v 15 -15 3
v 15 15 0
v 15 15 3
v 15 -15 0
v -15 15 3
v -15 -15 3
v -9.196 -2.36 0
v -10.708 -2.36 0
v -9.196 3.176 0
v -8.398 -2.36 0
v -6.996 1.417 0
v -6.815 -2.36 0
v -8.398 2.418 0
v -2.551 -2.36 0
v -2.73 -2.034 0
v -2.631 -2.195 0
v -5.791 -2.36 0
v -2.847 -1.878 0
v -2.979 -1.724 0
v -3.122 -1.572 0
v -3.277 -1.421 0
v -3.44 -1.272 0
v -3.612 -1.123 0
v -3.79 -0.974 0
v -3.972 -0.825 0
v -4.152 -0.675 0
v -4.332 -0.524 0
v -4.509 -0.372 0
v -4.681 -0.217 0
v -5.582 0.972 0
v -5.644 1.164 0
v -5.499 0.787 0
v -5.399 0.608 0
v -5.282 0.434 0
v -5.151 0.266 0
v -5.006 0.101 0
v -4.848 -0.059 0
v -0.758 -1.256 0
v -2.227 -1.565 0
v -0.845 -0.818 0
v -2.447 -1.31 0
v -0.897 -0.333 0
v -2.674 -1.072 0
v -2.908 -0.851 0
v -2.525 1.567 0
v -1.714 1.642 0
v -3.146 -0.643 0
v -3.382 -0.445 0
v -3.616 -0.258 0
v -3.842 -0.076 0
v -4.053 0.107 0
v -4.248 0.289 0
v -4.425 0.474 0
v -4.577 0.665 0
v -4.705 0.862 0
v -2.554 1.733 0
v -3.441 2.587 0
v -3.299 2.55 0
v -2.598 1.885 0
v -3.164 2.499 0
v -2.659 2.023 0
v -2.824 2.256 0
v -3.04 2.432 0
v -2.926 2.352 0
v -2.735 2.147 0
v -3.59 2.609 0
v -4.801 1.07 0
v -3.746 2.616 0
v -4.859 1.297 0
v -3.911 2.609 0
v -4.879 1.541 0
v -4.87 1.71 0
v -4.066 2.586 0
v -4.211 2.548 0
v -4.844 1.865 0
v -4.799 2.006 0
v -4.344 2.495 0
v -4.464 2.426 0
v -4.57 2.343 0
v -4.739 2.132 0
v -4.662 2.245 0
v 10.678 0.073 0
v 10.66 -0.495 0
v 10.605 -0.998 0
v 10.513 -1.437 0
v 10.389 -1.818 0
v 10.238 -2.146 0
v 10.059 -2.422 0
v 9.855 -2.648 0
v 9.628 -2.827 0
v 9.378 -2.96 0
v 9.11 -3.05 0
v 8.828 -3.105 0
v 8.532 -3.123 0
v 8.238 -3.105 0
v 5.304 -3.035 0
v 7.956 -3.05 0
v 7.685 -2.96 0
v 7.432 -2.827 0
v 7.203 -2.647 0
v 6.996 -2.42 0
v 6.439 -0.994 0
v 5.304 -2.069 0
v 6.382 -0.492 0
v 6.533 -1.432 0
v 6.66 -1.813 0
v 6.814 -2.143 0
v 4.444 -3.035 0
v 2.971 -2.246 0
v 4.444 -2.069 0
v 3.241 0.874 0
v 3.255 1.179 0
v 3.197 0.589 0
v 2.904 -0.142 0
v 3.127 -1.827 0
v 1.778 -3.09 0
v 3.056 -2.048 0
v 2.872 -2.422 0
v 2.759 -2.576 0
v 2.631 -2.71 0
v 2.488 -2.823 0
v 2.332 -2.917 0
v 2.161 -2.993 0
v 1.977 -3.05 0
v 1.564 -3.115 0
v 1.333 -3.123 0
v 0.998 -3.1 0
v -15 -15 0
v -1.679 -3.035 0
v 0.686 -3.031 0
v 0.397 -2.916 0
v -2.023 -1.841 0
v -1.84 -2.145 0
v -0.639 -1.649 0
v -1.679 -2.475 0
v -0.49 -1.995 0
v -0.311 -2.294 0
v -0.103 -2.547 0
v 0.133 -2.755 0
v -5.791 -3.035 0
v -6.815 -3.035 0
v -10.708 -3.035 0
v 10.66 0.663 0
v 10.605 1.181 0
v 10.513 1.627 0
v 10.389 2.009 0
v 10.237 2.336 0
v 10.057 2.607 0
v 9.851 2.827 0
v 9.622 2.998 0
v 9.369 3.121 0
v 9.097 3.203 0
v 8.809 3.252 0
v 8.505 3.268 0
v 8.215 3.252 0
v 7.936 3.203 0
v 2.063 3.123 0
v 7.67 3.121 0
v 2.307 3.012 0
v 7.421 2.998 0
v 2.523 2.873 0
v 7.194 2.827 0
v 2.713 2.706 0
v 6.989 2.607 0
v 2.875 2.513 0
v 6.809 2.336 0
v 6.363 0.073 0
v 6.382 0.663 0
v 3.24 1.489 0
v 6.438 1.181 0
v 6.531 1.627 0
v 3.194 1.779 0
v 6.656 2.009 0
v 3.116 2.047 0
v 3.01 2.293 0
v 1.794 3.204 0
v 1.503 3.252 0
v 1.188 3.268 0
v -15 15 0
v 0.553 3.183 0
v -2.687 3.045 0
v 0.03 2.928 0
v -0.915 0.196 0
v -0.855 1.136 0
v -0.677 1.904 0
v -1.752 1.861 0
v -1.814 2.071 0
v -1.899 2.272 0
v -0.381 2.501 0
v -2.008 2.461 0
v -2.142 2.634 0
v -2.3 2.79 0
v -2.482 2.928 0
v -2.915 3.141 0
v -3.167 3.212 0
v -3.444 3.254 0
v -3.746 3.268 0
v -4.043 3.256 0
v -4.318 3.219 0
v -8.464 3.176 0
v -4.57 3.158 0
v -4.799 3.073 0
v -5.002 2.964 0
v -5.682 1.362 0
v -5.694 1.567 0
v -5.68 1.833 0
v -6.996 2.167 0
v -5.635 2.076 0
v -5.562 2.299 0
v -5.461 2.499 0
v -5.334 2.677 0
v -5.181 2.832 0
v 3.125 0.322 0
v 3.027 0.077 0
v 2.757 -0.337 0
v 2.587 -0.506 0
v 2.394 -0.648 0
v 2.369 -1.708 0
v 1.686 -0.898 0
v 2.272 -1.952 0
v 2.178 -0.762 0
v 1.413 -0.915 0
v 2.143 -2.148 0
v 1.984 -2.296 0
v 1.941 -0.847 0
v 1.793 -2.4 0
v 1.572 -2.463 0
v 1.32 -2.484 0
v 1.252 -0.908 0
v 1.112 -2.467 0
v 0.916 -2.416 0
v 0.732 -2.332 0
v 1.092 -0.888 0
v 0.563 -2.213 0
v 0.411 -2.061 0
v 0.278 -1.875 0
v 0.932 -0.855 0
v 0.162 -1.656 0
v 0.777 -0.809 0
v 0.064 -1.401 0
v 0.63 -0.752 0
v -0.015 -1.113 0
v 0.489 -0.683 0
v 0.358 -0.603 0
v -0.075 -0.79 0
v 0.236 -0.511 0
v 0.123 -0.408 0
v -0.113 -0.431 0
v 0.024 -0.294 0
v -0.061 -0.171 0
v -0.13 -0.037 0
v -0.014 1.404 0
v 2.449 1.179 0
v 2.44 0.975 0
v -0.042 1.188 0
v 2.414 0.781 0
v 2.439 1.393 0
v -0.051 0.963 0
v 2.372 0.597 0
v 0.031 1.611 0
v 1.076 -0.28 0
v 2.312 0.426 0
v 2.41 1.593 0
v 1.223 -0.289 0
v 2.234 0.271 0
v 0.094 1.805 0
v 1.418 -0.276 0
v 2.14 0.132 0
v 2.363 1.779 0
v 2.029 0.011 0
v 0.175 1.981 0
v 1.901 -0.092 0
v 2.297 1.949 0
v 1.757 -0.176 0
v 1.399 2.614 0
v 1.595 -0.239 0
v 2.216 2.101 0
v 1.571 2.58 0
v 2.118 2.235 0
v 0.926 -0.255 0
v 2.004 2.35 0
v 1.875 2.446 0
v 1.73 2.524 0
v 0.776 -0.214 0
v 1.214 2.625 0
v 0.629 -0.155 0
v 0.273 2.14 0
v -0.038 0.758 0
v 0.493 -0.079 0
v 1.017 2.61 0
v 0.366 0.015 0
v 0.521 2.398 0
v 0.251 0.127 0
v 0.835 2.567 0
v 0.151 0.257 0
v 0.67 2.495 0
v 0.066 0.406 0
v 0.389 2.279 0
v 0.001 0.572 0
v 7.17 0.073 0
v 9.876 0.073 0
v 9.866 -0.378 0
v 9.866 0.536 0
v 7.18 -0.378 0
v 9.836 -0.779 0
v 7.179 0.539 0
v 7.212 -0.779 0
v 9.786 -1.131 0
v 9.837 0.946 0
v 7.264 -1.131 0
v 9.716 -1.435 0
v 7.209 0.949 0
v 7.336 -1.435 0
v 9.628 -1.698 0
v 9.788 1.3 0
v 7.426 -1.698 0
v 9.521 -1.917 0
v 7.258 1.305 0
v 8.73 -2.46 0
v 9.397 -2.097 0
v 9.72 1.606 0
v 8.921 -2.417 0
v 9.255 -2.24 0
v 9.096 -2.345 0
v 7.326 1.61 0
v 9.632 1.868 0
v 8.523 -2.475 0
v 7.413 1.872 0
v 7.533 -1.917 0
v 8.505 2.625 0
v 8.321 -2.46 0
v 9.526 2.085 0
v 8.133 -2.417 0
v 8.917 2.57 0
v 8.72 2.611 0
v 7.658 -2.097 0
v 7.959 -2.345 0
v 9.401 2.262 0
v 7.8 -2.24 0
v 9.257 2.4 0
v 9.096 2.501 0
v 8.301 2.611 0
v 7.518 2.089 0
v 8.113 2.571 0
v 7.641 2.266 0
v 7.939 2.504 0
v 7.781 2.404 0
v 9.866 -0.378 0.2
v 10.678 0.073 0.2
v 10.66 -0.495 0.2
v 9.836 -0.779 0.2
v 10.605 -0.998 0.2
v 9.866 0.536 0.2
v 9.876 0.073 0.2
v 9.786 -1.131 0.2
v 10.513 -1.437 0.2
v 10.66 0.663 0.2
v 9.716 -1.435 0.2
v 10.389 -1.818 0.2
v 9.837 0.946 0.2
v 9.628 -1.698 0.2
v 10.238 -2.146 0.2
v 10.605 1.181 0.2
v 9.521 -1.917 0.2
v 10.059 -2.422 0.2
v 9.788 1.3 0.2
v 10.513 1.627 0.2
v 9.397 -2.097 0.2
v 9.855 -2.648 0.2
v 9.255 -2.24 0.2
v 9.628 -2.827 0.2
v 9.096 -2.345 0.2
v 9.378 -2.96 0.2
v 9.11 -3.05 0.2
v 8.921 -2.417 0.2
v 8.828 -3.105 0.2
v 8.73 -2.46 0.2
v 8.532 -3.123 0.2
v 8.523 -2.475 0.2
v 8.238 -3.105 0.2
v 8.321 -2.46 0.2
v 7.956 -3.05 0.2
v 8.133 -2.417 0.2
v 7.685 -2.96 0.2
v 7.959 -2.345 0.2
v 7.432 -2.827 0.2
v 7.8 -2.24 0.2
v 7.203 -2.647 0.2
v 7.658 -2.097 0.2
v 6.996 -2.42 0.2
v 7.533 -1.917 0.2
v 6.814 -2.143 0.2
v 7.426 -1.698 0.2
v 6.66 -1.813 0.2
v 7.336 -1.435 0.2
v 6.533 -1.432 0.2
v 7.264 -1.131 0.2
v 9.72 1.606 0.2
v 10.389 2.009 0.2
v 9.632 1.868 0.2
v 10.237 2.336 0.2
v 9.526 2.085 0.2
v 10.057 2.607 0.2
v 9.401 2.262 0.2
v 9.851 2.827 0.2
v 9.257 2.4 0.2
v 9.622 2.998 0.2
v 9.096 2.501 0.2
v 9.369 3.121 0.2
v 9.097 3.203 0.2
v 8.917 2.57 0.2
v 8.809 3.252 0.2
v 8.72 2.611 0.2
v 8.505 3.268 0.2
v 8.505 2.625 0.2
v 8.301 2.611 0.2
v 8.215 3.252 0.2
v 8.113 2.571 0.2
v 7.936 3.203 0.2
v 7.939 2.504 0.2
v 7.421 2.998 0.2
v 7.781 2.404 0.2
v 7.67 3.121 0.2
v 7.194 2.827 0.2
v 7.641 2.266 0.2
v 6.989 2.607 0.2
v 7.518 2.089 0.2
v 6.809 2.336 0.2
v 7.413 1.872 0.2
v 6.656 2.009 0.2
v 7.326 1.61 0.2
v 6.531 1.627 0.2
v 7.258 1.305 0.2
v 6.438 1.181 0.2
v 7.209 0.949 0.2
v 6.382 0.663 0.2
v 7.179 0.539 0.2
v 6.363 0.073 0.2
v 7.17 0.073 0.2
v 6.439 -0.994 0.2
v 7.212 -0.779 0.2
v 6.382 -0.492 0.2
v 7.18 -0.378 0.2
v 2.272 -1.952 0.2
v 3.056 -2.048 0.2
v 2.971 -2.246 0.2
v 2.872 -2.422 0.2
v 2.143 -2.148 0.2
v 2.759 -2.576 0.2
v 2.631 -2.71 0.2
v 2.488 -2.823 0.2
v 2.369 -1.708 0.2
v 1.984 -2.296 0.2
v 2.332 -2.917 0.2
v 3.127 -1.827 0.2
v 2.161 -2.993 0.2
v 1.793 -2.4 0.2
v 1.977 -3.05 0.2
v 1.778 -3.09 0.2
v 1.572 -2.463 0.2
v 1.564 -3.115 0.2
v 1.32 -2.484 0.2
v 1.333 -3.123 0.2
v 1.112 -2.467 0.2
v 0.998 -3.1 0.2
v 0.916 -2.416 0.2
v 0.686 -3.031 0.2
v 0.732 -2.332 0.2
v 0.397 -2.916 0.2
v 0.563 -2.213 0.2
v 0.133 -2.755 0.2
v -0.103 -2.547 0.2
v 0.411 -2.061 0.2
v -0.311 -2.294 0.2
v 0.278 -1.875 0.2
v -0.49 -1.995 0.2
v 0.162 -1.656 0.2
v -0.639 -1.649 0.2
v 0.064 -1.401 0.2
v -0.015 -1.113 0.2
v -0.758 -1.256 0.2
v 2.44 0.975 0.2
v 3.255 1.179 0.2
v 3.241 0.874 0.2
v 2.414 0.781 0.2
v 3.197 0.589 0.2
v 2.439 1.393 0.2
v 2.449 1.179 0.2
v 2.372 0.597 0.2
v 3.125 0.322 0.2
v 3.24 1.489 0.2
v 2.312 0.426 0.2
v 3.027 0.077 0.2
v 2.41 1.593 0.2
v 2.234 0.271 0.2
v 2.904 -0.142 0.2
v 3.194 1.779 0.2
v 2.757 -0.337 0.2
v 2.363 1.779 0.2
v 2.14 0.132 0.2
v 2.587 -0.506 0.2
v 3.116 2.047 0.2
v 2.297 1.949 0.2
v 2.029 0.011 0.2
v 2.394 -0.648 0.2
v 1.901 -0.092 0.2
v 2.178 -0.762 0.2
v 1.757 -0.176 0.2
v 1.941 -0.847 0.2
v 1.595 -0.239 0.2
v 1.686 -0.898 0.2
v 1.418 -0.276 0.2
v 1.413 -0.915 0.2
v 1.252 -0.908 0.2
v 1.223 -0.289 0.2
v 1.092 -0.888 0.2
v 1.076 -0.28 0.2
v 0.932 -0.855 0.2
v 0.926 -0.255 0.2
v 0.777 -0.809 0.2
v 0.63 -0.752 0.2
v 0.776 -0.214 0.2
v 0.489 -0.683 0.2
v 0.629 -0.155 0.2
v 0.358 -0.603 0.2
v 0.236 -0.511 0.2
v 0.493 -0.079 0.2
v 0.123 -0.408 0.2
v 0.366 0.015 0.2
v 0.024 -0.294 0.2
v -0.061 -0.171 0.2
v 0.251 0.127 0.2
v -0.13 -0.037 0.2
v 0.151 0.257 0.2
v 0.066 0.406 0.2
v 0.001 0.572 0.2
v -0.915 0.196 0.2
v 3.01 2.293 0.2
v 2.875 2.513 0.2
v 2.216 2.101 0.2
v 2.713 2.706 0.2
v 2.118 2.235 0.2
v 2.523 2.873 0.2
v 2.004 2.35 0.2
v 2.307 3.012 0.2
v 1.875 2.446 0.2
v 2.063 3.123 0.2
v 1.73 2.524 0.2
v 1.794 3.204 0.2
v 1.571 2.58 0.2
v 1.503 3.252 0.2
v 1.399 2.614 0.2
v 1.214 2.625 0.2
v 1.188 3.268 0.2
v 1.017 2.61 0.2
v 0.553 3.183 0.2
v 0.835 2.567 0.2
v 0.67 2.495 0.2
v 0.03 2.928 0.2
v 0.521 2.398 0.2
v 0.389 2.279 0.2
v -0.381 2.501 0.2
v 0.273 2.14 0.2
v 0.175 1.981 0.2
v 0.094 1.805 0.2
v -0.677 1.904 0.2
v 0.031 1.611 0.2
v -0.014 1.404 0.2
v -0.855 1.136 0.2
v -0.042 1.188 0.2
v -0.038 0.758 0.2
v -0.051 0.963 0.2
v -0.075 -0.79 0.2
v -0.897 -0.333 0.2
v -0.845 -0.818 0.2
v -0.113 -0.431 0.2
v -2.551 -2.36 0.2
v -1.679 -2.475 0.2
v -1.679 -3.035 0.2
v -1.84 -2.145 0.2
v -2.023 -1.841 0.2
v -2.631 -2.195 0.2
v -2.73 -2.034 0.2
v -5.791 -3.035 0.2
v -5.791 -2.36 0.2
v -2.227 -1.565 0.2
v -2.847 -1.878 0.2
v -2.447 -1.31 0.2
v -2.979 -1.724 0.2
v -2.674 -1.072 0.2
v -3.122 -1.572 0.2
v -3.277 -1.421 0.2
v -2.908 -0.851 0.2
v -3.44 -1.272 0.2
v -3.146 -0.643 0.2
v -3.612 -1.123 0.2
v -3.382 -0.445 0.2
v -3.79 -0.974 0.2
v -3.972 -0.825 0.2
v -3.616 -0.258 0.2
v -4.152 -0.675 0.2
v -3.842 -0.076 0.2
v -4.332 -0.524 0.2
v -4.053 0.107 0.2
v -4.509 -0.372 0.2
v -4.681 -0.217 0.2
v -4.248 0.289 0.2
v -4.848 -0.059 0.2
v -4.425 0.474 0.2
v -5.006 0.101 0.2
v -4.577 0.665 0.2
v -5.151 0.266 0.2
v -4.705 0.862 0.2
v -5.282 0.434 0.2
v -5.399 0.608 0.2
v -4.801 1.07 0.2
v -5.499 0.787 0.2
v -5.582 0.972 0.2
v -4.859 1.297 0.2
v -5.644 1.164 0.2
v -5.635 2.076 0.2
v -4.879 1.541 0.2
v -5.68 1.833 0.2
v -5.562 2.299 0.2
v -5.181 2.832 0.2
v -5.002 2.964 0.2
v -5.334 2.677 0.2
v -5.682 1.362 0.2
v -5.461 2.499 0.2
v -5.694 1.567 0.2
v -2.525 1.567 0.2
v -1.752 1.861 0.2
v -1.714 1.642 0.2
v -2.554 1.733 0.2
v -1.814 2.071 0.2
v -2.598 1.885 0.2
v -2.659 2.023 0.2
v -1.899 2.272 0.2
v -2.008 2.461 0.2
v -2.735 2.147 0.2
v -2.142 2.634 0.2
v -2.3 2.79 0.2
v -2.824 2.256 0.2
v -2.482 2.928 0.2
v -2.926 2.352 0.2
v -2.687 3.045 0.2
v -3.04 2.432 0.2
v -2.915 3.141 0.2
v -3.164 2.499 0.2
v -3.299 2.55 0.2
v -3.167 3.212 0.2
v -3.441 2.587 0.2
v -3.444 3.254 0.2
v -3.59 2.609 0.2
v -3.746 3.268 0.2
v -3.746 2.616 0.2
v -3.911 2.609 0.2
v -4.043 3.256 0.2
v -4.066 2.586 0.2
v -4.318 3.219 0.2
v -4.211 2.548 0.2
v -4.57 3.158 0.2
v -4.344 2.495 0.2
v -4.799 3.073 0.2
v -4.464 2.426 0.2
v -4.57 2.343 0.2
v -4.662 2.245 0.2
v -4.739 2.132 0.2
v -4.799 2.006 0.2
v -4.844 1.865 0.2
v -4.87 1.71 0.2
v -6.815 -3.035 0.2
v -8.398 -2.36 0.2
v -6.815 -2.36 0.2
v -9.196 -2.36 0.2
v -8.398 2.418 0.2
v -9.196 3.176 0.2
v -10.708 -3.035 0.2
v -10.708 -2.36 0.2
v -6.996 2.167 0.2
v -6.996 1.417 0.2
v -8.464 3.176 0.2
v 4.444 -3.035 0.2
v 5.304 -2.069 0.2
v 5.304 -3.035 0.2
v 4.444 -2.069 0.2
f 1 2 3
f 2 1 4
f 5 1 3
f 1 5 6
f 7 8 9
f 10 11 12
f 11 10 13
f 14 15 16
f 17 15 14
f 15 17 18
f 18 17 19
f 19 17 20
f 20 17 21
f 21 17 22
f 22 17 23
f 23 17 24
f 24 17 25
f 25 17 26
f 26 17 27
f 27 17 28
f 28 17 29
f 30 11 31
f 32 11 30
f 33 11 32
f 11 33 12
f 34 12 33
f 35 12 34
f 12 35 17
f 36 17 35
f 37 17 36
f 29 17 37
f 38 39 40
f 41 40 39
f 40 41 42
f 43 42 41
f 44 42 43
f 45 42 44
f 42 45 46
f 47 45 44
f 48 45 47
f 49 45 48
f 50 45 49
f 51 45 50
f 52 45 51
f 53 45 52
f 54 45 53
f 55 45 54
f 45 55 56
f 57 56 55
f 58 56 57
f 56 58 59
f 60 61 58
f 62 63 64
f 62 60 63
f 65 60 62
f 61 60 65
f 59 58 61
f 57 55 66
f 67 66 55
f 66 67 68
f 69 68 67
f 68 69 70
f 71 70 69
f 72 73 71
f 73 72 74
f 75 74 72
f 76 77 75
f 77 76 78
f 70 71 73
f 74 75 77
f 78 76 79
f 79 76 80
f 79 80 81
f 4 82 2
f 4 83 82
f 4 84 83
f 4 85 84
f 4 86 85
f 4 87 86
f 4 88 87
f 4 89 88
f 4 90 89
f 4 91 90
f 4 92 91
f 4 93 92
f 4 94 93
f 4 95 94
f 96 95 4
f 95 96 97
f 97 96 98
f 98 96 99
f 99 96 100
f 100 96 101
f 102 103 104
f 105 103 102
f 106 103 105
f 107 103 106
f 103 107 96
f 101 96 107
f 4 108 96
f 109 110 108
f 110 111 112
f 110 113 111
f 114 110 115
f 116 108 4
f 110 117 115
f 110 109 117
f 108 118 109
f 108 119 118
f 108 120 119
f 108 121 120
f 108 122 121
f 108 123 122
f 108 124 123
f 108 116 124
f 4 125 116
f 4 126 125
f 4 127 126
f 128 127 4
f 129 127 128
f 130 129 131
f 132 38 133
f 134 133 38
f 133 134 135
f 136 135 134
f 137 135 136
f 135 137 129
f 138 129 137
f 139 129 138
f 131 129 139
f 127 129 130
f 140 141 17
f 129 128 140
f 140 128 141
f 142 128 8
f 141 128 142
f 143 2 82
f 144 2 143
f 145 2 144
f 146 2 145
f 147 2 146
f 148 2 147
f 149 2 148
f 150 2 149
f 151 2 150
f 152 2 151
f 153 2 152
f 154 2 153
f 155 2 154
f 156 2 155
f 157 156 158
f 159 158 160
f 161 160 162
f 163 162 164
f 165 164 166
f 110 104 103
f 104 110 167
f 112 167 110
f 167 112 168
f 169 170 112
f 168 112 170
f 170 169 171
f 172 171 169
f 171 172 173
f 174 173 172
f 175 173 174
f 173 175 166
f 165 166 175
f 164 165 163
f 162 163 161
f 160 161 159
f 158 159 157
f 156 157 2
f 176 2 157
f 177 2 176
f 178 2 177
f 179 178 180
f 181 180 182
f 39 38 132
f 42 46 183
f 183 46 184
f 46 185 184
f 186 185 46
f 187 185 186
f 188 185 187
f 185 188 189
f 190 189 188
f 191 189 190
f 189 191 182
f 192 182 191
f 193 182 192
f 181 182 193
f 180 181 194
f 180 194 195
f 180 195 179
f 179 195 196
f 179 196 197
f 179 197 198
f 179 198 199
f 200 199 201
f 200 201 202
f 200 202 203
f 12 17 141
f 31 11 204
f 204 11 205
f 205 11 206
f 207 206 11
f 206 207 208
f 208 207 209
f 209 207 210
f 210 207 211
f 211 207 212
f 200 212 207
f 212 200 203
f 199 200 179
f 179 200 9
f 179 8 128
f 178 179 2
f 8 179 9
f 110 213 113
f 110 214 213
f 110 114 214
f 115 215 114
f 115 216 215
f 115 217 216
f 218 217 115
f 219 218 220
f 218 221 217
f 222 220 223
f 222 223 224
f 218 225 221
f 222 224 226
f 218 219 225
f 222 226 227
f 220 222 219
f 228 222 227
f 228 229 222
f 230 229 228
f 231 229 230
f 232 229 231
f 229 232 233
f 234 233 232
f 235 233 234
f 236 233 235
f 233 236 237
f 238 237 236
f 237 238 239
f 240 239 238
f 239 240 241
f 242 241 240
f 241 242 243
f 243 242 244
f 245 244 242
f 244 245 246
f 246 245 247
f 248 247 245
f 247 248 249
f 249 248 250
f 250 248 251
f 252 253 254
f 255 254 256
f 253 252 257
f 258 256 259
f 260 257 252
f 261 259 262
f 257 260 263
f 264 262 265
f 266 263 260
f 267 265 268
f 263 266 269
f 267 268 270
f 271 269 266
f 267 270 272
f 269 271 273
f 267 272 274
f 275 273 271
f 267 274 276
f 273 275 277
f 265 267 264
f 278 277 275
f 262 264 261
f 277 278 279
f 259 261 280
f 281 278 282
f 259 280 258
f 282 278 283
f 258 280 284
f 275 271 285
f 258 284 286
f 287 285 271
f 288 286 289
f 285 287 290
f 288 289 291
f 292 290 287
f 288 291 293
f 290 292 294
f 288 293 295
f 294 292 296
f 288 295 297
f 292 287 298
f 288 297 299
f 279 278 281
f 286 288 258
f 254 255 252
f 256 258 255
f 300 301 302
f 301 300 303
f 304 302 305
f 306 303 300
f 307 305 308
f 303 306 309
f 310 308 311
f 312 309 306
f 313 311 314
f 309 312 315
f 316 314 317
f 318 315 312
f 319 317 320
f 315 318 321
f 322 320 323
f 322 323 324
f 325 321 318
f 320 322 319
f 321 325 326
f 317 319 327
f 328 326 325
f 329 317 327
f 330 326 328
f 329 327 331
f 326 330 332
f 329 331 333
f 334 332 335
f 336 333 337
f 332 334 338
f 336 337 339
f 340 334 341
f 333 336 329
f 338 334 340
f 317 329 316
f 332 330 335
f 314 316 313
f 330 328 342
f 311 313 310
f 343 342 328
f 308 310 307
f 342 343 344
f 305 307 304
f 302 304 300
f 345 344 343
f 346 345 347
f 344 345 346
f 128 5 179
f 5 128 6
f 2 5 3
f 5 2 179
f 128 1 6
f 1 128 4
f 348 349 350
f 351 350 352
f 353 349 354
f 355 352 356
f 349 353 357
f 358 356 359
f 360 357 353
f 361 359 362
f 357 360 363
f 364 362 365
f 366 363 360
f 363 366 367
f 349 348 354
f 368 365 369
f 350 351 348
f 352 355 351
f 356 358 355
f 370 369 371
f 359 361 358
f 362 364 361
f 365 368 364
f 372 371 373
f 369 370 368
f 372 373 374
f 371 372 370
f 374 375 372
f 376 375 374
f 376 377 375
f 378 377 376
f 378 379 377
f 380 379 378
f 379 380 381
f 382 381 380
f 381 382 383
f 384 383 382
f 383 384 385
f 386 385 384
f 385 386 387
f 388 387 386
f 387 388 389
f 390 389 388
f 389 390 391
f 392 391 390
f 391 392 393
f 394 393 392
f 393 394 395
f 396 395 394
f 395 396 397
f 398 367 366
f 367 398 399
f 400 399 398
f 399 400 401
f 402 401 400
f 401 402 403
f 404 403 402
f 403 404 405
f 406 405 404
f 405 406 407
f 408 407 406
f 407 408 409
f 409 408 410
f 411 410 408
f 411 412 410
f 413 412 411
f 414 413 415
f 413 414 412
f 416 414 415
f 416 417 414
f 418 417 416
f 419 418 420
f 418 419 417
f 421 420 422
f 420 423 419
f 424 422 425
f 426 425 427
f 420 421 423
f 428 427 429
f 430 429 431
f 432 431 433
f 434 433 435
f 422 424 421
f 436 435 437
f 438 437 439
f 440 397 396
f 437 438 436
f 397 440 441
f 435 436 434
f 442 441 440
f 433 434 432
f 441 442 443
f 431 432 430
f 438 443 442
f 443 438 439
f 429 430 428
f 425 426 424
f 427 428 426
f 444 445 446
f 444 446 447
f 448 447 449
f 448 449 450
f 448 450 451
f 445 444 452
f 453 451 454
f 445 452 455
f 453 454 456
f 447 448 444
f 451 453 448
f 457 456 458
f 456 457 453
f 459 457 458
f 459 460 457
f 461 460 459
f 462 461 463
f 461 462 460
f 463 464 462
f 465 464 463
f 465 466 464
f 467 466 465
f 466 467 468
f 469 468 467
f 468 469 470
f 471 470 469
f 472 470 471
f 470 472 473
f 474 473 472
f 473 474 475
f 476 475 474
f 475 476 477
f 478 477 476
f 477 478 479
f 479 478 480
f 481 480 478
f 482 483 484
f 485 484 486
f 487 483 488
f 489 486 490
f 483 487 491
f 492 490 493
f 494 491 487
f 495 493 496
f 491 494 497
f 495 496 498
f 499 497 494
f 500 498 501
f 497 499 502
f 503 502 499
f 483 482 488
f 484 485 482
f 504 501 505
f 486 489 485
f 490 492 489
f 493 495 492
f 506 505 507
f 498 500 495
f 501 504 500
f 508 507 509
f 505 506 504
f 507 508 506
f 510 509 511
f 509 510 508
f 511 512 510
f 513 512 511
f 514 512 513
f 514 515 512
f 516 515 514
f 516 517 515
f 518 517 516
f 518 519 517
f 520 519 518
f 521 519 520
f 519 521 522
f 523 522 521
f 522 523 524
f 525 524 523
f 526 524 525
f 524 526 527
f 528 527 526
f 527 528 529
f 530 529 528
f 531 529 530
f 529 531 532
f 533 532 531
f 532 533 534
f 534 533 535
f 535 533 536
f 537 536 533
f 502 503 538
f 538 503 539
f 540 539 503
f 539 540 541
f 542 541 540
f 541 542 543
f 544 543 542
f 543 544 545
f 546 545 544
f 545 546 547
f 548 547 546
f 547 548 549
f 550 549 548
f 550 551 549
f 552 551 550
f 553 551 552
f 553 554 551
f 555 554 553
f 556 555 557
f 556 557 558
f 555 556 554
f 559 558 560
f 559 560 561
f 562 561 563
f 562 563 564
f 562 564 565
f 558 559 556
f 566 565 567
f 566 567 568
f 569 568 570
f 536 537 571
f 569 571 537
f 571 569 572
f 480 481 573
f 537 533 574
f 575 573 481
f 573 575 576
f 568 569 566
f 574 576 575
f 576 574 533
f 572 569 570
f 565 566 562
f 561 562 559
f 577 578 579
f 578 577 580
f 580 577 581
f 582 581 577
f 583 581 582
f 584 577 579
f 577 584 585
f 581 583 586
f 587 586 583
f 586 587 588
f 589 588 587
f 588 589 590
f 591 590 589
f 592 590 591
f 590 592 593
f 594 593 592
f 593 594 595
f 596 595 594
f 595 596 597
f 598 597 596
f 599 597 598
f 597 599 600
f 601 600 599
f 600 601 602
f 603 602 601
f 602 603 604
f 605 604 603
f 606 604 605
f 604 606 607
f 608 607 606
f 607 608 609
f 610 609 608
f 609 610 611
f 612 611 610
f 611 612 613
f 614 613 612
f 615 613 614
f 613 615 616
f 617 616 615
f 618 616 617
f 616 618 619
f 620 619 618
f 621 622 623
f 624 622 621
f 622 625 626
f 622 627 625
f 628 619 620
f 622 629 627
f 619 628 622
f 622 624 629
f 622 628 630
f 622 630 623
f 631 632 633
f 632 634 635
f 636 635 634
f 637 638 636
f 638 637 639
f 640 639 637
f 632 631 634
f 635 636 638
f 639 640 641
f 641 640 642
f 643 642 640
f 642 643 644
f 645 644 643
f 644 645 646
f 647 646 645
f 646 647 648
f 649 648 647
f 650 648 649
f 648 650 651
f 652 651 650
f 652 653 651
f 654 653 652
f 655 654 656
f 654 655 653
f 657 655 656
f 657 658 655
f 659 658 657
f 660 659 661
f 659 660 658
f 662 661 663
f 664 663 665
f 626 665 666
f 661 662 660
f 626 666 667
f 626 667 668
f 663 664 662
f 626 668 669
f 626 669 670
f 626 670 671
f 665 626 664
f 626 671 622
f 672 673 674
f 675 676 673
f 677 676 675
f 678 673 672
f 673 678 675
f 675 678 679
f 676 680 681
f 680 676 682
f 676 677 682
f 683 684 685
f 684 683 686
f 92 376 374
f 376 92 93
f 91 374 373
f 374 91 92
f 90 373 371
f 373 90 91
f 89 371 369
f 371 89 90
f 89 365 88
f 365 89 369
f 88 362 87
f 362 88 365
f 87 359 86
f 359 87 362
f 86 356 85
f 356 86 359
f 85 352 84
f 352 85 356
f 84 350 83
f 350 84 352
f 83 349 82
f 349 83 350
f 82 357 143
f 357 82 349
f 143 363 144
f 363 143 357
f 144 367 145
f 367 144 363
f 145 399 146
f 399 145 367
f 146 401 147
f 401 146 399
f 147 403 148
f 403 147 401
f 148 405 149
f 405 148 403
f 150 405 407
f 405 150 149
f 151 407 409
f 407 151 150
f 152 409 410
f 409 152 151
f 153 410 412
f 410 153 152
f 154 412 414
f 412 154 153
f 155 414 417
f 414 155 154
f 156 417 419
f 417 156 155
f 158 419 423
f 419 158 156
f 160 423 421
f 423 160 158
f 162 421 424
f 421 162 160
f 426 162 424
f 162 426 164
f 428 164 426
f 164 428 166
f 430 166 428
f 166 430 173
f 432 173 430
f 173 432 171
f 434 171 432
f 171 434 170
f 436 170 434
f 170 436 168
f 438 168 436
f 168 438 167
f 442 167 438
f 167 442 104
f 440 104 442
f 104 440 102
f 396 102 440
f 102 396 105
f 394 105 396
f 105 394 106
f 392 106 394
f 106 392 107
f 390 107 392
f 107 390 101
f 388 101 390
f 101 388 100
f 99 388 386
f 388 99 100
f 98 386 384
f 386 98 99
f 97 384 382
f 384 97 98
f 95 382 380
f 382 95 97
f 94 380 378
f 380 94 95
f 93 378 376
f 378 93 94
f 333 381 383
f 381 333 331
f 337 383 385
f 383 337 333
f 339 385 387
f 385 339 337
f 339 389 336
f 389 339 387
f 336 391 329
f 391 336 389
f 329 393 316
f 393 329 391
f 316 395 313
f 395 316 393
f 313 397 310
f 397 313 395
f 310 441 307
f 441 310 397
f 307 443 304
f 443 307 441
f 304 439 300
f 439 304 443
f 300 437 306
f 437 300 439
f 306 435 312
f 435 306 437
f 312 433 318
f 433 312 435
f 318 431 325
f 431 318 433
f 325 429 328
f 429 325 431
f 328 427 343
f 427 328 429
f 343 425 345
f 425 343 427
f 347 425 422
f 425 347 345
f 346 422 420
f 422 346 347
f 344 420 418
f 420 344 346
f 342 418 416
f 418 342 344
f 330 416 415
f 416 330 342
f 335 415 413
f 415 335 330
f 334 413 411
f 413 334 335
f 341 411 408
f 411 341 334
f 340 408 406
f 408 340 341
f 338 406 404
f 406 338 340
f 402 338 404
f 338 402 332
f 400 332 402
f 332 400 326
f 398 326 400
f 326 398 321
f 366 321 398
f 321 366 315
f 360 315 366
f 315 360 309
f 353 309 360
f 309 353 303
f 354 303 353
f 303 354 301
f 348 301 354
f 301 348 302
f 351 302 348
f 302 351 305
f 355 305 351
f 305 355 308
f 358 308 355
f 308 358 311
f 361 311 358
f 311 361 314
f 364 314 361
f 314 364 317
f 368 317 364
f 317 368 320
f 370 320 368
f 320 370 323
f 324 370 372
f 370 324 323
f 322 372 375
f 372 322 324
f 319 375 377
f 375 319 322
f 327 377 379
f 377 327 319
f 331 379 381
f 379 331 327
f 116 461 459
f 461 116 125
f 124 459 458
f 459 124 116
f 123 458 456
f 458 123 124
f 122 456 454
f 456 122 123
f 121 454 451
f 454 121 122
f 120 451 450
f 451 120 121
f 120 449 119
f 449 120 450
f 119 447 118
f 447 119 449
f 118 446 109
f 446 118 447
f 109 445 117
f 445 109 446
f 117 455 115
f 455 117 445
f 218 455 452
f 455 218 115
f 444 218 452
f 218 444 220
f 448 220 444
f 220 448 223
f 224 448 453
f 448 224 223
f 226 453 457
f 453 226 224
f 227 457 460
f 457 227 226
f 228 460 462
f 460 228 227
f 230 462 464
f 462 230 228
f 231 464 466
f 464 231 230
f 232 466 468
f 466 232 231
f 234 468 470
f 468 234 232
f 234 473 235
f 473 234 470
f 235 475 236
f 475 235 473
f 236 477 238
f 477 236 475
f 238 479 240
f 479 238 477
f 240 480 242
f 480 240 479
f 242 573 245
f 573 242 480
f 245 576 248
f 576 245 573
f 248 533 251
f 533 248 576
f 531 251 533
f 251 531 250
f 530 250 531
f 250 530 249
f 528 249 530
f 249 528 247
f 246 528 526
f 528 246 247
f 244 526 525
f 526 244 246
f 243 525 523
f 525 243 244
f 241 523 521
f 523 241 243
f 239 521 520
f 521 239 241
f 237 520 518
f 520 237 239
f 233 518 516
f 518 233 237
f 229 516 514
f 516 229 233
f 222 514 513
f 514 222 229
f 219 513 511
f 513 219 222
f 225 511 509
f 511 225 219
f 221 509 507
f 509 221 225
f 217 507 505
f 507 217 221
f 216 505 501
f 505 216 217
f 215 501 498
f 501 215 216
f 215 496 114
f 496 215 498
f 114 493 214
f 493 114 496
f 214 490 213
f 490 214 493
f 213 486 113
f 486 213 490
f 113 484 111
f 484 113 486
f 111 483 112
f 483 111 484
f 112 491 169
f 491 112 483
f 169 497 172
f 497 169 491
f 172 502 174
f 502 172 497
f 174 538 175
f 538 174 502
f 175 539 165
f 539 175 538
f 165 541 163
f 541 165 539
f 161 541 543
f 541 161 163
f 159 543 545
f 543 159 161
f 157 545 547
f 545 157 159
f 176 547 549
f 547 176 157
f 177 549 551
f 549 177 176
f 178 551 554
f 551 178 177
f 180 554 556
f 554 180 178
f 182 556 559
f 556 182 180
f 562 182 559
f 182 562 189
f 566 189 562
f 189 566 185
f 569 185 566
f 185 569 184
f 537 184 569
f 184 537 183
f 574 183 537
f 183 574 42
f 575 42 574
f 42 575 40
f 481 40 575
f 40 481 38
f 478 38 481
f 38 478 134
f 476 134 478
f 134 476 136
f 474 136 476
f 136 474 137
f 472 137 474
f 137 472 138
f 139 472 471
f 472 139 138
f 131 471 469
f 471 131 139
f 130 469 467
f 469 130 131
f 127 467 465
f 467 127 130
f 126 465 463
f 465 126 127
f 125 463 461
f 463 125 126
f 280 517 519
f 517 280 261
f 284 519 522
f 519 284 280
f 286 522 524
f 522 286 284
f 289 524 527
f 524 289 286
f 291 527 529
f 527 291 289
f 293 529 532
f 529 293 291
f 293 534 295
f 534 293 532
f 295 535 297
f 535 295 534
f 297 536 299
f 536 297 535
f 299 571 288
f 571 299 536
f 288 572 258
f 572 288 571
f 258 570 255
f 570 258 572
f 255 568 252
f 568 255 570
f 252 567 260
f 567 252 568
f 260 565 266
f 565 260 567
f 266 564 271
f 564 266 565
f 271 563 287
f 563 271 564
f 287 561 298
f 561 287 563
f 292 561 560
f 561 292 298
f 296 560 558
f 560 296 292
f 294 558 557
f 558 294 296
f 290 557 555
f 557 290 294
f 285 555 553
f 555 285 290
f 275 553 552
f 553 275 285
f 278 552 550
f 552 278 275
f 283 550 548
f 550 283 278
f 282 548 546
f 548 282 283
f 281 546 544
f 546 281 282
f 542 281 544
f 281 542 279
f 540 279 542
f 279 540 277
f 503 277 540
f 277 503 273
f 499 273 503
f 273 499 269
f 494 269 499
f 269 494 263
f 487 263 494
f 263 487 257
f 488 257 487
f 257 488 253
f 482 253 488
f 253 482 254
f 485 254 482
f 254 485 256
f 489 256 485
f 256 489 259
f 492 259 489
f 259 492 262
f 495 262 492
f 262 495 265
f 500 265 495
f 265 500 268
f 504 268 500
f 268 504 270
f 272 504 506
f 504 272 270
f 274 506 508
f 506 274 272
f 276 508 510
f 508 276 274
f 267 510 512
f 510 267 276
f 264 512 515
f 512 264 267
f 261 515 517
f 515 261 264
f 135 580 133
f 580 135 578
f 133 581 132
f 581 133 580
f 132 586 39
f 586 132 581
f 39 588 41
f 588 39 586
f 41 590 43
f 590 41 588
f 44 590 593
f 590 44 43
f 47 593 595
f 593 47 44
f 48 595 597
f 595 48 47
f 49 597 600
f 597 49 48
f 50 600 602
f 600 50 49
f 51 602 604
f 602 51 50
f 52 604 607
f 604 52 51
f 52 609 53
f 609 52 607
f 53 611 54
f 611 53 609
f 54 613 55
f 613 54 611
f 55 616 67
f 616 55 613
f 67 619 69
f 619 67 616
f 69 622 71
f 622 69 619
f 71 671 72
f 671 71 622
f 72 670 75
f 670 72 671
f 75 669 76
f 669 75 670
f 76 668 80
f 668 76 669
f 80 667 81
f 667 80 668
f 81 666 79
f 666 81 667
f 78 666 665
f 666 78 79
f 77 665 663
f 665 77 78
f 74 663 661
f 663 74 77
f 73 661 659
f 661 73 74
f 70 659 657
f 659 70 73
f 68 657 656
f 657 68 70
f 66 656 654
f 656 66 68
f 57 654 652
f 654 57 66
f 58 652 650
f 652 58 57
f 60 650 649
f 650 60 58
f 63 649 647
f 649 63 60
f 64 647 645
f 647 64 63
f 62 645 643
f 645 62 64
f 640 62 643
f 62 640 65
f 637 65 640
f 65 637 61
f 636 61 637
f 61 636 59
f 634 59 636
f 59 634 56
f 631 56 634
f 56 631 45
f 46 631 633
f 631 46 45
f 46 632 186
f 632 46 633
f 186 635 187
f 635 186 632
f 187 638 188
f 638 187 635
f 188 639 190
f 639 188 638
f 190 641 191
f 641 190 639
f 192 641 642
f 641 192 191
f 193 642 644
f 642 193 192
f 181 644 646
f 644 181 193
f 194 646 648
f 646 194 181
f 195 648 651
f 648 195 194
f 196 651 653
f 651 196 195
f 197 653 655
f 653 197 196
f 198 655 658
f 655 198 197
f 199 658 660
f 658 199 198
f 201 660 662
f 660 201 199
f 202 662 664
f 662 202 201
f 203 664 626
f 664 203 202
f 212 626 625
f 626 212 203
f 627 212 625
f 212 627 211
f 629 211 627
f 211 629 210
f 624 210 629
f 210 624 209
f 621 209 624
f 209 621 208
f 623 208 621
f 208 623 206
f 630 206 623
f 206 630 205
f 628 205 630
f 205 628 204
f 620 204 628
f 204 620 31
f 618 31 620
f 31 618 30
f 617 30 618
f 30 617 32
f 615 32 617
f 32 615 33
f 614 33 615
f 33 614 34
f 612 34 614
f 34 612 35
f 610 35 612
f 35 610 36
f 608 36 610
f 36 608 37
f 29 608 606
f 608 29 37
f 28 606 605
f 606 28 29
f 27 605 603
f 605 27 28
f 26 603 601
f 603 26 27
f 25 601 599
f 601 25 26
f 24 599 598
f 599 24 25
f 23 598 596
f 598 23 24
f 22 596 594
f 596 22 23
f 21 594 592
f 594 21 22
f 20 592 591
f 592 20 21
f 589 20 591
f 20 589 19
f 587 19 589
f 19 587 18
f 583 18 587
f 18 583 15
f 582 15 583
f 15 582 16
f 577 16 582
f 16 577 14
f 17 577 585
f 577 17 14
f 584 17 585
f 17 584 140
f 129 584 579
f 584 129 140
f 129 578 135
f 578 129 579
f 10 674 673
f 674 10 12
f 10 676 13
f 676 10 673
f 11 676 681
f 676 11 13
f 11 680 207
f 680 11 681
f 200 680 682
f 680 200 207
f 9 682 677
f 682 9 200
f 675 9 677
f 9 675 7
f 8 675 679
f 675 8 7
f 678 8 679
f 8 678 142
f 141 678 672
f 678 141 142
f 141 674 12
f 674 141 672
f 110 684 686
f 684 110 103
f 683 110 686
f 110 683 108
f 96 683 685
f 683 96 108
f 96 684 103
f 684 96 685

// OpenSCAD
// the label printed to the part
em_value = "0.921";

text_size = 6.5;
text_font = "comic";
// layer height you are printing the em_cubes
layer_height = 0.2;

// width of the cube
cube_width = 30;
// depth of the cube
cube_depth = 30;
// height of the cube
cube_height = 3;

difference() {
	translate([-(cube_width/2), -(cube_depth/2), 0])
		cube([cube_width, cube_depth, cube_height]);
	translate([0,0,-layer_height])
		linear_extrude(layer_height*2)
			mirror([1,0,0])
				text(em_value, size = text_size, halign = "center", valign = "center");
}
